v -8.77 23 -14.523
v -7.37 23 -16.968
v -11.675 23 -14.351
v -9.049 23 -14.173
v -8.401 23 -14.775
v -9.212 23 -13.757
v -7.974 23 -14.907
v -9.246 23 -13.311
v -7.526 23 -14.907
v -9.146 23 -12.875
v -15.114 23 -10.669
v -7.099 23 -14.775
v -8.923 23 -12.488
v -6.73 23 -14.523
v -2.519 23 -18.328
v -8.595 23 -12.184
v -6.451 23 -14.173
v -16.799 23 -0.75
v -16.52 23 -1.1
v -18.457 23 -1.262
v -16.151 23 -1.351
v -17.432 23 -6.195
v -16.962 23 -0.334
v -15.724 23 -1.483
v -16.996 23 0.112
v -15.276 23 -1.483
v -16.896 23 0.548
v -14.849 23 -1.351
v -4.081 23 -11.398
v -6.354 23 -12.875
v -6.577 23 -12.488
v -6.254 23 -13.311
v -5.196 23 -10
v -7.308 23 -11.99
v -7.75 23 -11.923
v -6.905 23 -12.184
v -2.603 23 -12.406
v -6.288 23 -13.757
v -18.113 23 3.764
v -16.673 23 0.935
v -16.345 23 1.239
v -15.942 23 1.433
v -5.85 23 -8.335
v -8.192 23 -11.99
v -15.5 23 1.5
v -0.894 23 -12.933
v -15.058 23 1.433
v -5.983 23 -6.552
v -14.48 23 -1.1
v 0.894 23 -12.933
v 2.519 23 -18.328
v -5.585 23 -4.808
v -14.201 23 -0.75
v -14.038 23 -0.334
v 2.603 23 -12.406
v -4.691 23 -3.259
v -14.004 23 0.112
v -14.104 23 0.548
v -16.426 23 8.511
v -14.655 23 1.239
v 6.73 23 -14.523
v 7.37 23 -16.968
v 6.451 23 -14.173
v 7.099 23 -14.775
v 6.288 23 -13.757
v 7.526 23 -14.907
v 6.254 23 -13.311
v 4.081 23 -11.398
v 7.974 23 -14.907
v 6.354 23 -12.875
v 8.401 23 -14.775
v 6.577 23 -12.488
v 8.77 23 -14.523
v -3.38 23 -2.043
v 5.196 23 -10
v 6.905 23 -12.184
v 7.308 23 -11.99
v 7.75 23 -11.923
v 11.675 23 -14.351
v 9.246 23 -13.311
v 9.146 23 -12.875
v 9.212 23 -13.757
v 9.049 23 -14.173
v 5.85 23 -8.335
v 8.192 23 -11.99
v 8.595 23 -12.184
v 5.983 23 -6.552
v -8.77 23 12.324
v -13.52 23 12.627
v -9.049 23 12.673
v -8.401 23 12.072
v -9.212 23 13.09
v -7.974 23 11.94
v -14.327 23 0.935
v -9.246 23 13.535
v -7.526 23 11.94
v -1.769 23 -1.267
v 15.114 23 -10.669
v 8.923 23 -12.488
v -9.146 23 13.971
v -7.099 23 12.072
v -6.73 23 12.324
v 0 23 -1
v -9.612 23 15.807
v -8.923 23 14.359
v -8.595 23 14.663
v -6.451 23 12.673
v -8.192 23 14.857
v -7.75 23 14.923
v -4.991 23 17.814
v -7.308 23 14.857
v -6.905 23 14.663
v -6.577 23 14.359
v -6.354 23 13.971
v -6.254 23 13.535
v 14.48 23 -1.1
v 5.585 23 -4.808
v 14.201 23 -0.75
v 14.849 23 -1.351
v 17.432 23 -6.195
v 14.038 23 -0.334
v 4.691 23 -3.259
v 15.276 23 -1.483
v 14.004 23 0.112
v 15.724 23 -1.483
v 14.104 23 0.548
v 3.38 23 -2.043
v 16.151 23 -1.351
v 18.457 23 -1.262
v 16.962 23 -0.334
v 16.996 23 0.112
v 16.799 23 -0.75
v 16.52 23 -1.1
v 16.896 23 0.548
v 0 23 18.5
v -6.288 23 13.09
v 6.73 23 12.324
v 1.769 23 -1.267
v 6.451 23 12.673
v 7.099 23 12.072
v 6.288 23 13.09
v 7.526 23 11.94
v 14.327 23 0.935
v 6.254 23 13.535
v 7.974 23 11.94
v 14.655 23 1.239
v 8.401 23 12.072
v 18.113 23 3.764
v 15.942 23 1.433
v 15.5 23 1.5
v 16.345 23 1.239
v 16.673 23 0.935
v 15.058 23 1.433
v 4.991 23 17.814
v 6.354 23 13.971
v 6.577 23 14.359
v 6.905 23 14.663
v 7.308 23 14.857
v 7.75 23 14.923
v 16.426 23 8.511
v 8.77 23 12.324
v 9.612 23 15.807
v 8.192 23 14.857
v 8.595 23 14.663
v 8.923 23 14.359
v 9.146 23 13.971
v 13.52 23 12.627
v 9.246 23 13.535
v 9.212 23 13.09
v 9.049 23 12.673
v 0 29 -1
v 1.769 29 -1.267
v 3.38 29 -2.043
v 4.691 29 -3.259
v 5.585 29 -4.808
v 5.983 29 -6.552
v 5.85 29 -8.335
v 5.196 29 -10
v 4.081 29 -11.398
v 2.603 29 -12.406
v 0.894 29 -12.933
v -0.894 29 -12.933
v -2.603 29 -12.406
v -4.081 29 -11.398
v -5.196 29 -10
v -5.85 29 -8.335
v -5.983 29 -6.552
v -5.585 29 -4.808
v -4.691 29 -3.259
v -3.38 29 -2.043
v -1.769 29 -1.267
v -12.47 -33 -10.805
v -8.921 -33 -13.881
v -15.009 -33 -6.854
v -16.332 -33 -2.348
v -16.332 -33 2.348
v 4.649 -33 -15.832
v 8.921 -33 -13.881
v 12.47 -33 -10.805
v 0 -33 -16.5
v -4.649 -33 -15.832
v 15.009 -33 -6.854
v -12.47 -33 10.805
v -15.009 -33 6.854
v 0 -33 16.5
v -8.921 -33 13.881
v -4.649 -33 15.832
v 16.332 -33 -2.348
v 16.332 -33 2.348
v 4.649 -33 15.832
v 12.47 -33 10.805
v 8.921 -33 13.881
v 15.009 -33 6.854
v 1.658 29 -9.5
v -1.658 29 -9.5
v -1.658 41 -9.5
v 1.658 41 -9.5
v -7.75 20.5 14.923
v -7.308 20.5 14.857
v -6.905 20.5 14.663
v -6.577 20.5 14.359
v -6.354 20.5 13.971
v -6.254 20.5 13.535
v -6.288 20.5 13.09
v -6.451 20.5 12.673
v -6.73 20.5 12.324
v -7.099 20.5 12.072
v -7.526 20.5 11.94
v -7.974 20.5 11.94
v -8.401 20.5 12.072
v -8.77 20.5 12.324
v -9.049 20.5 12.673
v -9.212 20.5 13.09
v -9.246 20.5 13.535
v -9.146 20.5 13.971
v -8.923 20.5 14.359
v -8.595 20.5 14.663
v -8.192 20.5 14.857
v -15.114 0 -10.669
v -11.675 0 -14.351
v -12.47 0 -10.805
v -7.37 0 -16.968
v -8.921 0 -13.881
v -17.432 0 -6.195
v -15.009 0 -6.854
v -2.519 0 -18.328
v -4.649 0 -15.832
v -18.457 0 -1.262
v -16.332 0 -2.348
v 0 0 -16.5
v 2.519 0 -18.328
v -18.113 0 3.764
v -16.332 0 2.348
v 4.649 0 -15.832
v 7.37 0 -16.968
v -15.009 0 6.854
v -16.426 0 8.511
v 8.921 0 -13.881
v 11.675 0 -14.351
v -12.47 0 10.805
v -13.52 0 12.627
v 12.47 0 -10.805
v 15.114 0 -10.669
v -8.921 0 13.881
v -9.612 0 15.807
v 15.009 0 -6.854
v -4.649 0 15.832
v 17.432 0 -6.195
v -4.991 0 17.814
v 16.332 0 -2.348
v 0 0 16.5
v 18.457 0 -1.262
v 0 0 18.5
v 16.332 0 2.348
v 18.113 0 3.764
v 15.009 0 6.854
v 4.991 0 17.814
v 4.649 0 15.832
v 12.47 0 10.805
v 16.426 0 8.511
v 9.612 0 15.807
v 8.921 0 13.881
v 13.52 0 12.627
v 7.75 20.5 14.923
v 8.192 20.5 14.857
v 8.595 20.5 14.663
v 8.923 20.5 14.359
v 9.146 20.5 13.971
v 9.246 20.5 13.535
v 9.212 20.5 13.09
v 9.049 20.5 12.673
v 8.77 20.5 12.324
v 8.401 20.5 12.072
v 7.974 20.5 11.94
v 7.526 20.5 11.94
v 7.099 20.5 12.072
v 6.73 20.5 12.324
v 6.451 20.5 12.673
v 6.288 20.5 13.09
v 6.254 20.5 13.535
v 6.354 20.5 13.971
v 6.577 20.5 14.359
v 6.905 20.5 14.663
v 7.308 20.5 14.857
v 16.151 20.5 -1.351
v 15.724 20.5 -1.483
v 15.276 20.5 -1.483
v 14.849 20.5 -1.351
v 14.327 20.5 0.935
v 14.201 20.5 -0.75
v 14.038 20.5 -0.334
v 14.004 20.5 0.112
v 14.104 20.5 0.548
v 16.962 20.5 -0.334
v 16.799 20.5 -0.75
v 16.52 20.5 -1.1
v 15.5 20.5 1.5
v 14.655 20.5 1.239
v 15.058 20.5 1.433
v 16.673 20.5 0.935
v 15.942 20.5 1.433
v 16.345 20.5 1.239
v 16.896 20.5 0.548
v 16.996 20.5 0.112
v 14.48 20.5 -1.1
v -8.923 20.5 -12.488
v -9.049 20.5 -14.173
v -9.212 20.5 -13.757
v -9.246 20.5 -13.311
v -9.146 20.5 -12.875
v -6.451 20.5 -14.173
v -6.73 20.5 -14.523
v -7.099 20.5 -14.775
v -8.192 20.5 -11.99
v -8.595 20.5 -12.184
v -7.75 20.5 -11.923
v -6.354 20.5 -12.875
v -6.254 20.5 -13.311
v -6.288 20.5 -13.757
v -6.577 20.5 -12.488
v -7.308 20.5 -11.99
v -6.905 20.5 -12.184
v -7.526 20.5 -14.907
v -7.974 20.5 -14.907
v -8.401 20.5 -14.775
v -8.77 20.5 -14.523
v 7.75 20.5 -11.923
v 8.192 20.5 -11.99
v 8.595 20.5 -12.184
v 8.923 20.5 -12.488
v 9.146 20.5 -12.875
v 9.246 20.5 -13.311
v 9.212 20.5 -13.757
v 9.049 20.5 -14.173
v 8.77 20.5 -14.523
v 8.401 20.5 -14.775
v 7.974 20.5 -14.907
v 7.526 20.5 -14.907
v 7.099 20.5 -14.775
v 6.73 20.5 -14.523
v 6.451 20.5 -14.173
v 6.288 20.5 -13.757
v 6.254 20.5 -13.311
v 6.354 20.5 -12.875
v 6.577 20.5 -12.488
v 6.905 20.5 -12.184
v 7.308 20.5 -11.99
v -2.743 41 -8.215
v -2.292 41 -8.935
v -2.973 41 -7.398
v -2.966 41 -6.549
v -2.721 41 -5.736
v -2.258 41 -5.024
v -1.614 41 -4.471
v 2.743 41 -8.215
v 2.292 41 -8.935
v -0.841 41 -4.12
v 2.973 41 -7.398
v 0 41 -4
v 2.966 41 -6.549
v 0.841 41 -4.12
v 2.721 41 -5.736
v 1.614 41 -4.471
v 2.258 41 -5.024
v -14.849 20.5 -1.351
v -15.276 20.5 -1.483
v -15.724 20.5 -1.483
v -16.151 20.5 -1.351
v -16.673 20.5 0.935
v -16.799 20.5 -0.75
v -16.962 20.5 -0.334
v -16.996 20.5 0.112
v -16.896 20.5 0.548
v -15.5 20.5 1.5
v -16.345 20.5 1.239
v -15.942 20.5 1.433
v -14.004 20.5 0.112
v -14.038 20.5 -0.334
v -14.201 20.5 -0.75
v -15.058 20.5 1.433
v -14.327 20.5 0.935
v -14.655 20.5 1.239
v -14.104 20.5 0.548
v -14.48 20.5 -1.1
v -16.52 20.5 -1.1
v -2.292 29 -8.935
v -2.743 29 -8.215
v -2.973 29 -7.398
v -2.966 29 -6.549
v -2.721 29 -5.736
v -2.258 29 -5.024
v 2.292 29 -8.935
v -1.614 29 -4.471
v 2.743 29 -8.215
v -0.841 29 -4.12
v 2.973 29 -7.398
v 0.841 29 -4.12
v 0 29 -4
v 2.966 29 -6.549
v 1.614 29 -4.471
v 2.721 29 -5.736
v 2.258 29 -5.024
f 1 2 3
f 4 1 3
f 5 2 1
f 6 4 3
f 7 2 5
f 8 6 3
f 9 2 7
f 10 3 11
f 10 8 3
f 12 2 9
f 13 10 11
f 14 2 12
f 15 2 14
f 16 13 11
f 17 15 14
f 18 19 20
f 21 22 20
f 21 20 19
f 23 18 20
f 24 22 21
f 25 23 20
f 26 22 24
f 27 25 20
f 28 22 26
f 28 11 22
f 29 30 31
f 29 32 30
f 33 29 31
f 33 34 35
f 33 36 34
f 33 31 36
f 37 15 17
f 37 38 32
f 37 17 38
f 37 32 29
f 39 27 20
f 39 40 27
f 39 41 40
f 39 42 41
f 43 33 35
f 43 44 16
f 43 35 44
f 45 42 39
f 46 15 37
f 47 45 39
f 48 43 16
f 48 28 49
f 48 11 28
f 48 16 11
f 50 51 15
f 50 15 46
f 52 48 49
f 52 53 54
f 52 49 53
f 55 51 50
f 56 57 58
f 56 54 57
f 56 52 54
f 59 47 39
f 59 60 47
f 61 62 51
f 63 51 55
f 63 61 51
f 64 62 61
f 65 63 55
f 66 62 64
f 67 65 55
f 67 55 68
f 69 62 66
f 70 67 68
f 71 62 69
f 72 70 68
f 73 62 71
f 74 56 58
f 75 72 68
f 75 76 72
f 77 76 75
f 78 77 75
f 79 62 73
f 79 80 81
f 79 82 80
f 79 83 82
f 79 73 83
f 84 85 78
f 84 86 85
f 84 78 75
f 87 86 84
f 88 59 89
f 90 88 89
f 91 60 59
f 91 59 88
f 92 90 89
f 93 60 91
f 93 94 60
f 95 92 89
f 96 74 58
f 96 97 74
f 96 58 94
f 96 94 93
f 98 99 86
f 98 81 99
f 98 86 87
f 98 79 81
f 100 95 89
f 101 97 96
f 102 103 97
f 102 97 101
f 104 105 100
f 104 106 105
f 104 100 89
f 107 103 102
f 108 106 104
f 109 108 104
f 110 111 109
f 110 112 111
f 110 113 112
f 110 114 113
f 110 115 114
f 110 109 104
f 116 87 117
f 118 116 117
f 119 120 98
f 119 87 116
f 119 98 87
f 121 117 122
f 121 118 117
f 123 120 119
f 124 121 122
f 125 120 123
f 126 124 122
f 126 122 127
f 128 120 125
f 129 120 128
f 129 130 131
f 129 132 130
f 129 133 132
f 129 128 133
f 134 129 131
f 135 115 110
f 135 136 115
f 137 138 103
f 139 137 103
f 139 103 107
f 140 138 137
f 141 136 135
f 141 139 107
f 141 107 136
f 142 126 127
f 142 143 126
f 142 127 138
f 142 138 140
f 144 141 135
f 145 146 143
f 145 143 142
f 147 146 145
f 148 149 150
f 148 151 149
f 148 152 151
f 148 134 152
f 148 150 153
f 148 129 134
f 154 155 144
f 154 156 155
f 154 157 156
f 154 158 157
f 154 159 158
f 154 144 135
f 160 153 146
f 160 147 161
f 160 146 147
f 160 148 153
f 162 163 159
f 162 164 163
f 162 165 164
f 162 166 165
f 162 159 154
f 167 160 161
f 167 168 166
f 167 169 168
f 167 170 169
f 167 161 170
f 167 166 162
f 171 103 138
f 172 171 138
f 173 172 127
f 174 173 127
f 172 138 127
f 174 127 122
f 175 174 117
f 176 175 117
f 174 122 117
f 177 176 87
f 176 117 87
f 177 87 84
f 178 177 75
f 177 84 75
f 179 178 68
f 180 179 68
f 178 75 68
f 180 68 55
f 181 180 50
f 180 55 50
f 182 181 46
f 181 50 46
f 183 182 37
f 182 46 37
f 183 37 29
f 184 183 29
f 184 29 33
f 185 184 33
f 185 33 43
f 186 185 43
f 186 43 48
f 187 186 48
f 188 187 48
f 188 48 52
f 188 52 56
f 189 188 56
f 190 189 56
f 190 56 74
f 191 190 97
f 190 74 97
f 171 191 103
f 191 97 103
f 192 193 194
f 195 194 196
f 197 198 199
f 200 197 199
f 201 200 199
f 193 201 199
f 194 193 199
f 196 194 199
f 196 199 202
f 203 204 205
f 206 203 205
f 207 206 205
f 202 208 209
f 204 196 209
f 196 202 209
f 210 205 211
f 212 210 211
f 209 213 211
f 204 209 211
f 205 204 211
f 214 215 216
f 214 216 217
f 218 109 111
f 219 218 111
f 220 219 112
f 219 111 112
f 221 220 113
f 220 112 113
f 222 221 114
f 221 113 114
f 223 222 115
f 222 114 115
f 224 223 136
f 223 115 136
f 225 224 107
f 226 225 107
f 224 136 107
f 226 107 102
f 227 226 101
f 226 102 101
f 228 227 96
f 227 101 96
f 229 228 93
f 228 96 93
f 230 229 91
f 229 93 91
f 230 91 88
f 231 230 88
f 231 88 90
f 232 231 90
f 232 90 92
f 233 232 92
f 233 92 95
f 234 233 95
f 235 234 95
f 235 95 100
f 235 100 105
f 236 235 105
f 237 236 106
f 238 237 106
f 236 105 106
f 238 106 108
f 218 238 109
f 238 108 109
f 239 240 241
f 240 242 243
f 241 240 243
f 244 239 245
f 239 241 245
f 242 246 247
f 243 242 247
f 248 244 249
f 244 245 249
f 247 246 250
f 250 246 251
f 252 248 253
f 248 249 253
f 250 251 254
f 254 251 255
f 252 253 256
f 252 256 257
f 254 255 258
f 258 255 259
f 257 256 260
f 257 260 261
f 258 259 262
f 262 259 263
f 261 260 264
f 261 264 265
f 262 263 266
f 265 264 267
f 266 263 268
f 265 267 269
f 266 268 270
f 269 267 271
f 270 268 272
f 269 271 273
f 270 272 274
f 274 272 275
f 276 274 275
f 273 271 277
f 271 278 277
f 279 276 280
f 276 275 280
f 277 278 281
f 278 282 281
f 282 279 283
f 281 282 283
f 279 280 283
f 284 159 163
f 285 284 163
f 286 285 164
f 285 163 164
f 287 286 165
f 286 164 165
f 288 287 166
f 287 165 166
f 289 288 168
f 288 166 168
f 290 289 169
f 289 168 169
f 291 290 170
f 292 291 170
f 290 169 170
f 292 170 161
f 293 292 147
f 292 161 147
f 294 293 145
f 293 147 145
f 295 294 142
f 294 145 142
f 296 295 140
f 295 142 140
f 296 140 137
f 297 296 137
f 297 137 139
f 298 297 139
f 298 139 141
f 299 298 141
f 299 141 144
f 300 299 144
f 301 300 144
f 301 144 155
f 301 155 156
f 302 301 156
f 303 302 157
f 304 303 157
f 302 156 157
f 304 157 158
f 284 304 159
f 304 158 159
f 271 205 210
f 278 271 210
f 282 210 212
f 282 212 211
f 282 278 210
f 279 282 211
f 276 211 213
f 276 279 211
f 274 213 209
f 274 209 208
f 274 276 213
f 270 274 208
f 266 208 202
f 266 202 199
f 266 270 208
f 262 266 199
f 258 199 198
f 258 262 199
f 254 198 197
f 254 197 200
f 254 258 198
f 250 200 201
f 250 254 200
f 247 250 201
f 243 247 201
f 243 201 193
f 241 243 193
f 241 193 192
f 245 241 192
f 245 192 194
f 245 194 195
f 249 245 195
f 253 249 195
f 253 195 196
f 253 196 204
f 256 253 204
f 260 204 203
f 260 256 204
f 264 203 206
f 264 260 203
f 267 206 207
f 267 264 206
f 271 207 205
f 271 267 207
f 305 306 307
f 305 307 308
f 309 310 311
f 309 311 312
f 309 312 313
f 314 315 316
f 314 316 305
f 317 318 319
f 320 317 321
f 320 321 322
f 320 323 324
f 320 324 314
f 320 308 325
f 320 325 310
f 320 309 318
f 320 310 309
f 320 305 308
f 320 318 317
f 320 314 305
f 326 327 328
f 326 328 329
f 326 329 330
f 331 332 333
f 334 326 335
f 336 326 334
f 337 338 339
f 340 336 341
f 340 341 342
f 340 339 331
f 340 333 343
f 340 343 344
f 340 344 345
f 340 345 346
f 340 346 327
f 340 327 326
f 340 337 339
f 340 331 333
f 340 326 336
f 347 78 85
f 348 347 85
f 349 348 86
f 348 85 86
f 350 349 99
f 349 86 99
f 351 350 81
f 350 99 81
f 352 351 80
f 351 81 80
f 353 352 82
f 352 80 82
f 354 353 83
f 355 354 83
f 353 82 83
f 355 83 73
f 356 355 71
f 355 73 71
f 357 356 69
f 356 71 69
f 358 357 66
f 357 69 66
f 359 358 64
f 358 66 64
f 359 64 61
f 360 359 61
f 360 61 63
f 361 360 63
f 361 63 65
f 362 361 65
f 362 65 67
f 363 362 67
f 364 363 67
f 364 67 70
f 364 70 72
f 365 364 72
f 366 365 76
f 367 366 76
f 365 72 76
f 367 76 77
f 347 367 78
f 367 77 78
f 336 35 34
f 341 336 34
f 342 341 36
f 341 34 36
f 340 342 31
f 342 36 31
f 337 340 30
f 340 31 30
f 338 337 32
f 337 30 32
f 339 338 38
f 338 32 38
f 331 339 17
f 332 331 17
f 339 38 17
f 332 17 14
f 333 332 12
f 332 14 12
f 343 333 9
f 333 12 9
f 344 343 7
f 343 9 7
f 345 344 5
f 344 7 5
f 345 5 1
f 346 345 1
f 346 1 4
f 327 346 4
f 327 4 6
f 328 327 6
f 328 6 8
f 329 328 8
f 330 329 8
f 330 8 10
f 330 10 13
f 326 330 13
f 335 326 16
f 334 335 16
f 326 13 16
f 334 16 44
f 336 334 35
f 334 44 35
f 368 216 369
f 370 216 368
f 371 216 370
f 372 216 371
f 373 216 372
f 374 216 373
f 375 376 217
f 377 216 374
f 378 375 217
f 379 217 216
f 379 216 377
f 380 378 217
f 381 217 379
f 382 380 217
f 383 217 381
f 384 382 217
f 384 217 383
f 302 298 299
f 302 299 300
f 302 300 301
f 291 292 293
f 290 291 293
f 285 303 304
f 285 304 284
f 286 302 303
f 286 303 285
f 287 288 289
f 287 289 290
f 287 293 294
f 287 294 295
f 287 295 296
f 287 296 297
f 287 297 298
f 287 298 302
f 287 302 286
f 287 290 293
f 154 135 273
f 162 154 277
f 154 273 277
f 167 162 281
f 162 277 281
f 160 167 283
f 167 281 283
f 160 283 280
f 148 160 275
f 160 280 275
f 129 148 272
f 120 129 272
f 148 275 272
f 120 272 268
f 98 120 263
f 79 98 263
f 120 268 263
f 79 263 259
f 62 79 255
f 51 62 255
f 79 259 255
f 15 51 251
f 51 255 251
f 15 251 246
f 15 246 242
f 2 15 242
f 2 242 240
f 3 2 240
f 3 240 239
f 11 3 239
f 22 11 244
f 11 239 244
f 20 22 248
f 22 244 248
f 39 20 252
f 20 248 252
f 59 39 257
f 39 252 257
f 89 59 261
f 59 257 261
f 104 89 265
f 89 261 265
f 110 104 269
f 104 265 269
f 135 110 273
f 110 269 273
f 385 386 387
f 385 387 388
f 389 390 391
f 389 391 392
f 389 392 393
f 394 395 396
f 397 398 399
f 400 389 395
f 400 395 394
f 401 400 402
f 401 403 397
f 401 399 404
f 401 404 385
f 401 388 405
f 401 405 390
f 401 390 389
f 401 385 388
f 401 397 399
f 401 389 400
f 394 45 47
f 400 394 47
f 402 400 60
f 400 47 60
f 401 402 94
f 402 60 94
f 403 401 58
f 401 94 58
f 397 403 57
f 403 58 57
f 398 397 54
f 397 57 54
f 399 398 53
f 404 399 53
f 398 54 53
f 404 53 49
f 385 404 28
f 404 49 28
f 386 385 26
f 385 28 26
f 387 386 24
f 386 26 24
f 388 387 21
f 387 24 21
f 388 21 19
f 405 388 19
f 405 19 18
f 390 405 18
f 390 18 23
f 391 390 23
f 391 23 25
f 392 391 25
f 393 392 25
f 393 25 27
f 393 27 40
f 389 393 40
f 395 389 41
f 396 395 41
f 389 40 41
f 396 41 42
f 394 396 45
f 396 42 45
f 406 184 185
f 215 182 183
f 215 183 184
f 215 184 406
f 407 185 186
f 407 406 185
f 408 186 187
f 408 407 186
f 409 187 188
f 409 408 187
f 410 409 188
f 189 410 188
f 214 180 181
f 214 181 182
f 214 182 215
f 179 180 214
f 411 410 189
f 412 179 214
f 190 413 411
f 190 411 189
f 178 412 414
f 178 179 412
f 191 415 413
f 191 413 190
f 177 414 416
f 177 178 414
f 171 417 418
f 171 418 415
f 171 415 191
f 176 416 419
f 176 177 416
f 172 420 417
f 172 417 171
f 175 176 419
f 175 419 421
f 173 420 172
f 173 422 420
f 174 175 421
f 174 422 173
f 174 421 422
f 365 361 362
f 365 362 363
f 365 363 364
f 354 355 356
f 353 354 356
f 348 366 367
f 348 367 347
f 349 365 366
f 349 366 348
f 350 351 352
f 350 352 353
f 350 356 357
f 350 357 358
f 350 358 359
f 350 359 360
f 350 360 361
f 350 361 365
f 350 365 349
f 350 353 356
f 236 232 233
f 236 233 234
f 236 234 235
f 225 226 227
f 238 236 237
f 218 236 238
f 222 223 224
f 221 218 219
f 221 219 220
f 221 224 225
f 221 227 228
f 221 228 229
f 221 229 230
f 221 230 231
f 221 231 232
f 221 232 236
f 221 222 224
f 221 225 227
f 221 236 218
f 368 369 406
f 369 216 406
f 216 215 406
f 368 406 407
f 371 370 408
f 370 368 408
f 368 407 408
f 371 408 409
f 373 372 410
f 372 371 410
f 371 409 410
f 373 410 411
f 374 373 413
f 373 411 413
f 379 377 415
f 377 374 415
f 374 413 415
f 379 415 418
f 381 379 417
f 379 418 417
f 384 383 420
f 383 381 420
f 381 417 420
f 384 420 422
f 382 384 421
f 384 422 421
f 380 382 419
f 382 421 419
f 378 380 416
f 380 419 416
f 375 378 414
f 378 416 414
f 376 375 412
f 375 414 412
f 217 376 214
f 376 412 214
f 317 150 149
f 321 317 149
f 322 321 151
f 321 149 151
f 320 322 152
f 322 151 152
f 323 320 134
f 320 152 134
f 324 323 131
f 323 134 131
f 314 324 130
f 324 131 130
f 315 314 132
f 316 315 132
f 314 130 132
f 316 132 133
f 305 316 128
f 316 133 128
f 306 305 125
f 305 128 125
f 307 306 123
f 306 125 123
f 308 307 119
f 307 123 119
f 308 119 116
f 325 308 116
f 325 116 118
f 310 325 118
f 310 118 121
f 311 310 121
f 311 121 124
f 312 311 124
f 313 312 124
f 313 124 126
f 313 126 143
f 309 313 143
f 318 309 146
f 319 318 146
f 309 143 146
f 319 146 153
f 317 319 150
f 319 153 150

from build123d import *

# Parameters (mm, degrees)
SKETCH_1_R          = 16.5
EXTRUDE_1_DEPTH     = 33
SKETCH_1_3_R        = 18.5
EXTRUDE_2_DEPTH     = 23
SKETCH_3_R          = 1.5
CUT_EXTRUDE_1_DEPTH = 2.5
SKETCH_3_3_R        = 3
EXTRUDE_3_DEPTH     = 18
SKETCH_3_4_R        = 6
EXTRUDE_4_DEPTH     = 6
CUT_EXTRUDE_START   = -12
CUT_EXTRUDE_2_DEPTH = 12


with BuildPart() as part:
    # 草图1 → 凸台-拉伸1 (new body)
    with BuildSketch(Plane(origin=(0, 0, 0), x_dir=(1, 0, 0), z_dir=(0, 1, 0))):
        Circle(SKETCH_1_R)
    extrude(amount=-EXTRUDE_1_DEPTH)

    # 草图1<3> → 凸台-拉伸2 (add)
    with BuildSketch(Plane(origin=(0, 0, 0), x_dir=(1, 0, 0), z_dir=(0, 1, 0))):
        Circle(SKETCH_1_3_R)
    extrude(amount=EXTRUDE_2_DEPTH)

    # 草图3 → 切除-拉伸1 (cut)
    with BuildSketch(Plane(origin=(0, 23, 0), x_dir=(1, 0, 0), z_dir=(0, 1, 0))):
        with Locations((-7.75, 13.423393759)):
            Circle(SKETCH_3_R)
        with Locations((7.75, 13.423393759)):
            Circle(SKETCH_3_R)
        with Locations((15.5, 0)):
            Circle(SKETCH_3_R)
        with Locations((7.75, -13.423393759)):
            Circle(SKETCH_3_R)
        with Locations((-7.75, -13.423393759)):
            Circle(SKETCH_3_R)
        with Locations((-15.5, 0)):
            Circle(SKETCH_3_R)
    extrude(amount=-CUT_EXTRUDE_1_DEPTH, mode=Mode.SUBTRACT)

    # 草图3<3> → 凸台-拉伸3 (add)
    with BuildSketch(Plane(origin=(0, 23, 0), x_dir=(1, 0, 0), z_dir=(0, 1, 0))):
        with Locations((0, 7)):
            Circle(SKETCH_3_3_R)
    extrude(amount=EXTRUDE_3_DEPTH)

    # 草图3<4> → 凸台-拉伸4 (add)
    with BuildSketch(Plane(origin=(0, 23, 0), x_dir=(1, 0, 0), z_dir=(0, 1, 0))):
        with Locations((0, 7)):
            Circle(SKETCH_3_4_R)
    extrude(amount=EXTRUDE_4_DEPTH)

    # 草图4 → 切除-拉伸2 (cut)
    with BuildSketch(Plane(origin=(0, 41, 0), x_dir=(1, 0, 0), z_dir=(0, 1, 0)).offset(CUT_EXTRUDE_START)):
        with BuildLine():
            Line((-1.658312395, 9.5), (1.658312395, 9.5))
            ThreePointArc((1.658312395, 9.5), (0, 10), (-1.658312395, 9.5))
        make_face()
    extrude(amount=CUT_EXTRUDE_2_DEPTH, mode=Mode.SUBTRACT)


solid = part.part
